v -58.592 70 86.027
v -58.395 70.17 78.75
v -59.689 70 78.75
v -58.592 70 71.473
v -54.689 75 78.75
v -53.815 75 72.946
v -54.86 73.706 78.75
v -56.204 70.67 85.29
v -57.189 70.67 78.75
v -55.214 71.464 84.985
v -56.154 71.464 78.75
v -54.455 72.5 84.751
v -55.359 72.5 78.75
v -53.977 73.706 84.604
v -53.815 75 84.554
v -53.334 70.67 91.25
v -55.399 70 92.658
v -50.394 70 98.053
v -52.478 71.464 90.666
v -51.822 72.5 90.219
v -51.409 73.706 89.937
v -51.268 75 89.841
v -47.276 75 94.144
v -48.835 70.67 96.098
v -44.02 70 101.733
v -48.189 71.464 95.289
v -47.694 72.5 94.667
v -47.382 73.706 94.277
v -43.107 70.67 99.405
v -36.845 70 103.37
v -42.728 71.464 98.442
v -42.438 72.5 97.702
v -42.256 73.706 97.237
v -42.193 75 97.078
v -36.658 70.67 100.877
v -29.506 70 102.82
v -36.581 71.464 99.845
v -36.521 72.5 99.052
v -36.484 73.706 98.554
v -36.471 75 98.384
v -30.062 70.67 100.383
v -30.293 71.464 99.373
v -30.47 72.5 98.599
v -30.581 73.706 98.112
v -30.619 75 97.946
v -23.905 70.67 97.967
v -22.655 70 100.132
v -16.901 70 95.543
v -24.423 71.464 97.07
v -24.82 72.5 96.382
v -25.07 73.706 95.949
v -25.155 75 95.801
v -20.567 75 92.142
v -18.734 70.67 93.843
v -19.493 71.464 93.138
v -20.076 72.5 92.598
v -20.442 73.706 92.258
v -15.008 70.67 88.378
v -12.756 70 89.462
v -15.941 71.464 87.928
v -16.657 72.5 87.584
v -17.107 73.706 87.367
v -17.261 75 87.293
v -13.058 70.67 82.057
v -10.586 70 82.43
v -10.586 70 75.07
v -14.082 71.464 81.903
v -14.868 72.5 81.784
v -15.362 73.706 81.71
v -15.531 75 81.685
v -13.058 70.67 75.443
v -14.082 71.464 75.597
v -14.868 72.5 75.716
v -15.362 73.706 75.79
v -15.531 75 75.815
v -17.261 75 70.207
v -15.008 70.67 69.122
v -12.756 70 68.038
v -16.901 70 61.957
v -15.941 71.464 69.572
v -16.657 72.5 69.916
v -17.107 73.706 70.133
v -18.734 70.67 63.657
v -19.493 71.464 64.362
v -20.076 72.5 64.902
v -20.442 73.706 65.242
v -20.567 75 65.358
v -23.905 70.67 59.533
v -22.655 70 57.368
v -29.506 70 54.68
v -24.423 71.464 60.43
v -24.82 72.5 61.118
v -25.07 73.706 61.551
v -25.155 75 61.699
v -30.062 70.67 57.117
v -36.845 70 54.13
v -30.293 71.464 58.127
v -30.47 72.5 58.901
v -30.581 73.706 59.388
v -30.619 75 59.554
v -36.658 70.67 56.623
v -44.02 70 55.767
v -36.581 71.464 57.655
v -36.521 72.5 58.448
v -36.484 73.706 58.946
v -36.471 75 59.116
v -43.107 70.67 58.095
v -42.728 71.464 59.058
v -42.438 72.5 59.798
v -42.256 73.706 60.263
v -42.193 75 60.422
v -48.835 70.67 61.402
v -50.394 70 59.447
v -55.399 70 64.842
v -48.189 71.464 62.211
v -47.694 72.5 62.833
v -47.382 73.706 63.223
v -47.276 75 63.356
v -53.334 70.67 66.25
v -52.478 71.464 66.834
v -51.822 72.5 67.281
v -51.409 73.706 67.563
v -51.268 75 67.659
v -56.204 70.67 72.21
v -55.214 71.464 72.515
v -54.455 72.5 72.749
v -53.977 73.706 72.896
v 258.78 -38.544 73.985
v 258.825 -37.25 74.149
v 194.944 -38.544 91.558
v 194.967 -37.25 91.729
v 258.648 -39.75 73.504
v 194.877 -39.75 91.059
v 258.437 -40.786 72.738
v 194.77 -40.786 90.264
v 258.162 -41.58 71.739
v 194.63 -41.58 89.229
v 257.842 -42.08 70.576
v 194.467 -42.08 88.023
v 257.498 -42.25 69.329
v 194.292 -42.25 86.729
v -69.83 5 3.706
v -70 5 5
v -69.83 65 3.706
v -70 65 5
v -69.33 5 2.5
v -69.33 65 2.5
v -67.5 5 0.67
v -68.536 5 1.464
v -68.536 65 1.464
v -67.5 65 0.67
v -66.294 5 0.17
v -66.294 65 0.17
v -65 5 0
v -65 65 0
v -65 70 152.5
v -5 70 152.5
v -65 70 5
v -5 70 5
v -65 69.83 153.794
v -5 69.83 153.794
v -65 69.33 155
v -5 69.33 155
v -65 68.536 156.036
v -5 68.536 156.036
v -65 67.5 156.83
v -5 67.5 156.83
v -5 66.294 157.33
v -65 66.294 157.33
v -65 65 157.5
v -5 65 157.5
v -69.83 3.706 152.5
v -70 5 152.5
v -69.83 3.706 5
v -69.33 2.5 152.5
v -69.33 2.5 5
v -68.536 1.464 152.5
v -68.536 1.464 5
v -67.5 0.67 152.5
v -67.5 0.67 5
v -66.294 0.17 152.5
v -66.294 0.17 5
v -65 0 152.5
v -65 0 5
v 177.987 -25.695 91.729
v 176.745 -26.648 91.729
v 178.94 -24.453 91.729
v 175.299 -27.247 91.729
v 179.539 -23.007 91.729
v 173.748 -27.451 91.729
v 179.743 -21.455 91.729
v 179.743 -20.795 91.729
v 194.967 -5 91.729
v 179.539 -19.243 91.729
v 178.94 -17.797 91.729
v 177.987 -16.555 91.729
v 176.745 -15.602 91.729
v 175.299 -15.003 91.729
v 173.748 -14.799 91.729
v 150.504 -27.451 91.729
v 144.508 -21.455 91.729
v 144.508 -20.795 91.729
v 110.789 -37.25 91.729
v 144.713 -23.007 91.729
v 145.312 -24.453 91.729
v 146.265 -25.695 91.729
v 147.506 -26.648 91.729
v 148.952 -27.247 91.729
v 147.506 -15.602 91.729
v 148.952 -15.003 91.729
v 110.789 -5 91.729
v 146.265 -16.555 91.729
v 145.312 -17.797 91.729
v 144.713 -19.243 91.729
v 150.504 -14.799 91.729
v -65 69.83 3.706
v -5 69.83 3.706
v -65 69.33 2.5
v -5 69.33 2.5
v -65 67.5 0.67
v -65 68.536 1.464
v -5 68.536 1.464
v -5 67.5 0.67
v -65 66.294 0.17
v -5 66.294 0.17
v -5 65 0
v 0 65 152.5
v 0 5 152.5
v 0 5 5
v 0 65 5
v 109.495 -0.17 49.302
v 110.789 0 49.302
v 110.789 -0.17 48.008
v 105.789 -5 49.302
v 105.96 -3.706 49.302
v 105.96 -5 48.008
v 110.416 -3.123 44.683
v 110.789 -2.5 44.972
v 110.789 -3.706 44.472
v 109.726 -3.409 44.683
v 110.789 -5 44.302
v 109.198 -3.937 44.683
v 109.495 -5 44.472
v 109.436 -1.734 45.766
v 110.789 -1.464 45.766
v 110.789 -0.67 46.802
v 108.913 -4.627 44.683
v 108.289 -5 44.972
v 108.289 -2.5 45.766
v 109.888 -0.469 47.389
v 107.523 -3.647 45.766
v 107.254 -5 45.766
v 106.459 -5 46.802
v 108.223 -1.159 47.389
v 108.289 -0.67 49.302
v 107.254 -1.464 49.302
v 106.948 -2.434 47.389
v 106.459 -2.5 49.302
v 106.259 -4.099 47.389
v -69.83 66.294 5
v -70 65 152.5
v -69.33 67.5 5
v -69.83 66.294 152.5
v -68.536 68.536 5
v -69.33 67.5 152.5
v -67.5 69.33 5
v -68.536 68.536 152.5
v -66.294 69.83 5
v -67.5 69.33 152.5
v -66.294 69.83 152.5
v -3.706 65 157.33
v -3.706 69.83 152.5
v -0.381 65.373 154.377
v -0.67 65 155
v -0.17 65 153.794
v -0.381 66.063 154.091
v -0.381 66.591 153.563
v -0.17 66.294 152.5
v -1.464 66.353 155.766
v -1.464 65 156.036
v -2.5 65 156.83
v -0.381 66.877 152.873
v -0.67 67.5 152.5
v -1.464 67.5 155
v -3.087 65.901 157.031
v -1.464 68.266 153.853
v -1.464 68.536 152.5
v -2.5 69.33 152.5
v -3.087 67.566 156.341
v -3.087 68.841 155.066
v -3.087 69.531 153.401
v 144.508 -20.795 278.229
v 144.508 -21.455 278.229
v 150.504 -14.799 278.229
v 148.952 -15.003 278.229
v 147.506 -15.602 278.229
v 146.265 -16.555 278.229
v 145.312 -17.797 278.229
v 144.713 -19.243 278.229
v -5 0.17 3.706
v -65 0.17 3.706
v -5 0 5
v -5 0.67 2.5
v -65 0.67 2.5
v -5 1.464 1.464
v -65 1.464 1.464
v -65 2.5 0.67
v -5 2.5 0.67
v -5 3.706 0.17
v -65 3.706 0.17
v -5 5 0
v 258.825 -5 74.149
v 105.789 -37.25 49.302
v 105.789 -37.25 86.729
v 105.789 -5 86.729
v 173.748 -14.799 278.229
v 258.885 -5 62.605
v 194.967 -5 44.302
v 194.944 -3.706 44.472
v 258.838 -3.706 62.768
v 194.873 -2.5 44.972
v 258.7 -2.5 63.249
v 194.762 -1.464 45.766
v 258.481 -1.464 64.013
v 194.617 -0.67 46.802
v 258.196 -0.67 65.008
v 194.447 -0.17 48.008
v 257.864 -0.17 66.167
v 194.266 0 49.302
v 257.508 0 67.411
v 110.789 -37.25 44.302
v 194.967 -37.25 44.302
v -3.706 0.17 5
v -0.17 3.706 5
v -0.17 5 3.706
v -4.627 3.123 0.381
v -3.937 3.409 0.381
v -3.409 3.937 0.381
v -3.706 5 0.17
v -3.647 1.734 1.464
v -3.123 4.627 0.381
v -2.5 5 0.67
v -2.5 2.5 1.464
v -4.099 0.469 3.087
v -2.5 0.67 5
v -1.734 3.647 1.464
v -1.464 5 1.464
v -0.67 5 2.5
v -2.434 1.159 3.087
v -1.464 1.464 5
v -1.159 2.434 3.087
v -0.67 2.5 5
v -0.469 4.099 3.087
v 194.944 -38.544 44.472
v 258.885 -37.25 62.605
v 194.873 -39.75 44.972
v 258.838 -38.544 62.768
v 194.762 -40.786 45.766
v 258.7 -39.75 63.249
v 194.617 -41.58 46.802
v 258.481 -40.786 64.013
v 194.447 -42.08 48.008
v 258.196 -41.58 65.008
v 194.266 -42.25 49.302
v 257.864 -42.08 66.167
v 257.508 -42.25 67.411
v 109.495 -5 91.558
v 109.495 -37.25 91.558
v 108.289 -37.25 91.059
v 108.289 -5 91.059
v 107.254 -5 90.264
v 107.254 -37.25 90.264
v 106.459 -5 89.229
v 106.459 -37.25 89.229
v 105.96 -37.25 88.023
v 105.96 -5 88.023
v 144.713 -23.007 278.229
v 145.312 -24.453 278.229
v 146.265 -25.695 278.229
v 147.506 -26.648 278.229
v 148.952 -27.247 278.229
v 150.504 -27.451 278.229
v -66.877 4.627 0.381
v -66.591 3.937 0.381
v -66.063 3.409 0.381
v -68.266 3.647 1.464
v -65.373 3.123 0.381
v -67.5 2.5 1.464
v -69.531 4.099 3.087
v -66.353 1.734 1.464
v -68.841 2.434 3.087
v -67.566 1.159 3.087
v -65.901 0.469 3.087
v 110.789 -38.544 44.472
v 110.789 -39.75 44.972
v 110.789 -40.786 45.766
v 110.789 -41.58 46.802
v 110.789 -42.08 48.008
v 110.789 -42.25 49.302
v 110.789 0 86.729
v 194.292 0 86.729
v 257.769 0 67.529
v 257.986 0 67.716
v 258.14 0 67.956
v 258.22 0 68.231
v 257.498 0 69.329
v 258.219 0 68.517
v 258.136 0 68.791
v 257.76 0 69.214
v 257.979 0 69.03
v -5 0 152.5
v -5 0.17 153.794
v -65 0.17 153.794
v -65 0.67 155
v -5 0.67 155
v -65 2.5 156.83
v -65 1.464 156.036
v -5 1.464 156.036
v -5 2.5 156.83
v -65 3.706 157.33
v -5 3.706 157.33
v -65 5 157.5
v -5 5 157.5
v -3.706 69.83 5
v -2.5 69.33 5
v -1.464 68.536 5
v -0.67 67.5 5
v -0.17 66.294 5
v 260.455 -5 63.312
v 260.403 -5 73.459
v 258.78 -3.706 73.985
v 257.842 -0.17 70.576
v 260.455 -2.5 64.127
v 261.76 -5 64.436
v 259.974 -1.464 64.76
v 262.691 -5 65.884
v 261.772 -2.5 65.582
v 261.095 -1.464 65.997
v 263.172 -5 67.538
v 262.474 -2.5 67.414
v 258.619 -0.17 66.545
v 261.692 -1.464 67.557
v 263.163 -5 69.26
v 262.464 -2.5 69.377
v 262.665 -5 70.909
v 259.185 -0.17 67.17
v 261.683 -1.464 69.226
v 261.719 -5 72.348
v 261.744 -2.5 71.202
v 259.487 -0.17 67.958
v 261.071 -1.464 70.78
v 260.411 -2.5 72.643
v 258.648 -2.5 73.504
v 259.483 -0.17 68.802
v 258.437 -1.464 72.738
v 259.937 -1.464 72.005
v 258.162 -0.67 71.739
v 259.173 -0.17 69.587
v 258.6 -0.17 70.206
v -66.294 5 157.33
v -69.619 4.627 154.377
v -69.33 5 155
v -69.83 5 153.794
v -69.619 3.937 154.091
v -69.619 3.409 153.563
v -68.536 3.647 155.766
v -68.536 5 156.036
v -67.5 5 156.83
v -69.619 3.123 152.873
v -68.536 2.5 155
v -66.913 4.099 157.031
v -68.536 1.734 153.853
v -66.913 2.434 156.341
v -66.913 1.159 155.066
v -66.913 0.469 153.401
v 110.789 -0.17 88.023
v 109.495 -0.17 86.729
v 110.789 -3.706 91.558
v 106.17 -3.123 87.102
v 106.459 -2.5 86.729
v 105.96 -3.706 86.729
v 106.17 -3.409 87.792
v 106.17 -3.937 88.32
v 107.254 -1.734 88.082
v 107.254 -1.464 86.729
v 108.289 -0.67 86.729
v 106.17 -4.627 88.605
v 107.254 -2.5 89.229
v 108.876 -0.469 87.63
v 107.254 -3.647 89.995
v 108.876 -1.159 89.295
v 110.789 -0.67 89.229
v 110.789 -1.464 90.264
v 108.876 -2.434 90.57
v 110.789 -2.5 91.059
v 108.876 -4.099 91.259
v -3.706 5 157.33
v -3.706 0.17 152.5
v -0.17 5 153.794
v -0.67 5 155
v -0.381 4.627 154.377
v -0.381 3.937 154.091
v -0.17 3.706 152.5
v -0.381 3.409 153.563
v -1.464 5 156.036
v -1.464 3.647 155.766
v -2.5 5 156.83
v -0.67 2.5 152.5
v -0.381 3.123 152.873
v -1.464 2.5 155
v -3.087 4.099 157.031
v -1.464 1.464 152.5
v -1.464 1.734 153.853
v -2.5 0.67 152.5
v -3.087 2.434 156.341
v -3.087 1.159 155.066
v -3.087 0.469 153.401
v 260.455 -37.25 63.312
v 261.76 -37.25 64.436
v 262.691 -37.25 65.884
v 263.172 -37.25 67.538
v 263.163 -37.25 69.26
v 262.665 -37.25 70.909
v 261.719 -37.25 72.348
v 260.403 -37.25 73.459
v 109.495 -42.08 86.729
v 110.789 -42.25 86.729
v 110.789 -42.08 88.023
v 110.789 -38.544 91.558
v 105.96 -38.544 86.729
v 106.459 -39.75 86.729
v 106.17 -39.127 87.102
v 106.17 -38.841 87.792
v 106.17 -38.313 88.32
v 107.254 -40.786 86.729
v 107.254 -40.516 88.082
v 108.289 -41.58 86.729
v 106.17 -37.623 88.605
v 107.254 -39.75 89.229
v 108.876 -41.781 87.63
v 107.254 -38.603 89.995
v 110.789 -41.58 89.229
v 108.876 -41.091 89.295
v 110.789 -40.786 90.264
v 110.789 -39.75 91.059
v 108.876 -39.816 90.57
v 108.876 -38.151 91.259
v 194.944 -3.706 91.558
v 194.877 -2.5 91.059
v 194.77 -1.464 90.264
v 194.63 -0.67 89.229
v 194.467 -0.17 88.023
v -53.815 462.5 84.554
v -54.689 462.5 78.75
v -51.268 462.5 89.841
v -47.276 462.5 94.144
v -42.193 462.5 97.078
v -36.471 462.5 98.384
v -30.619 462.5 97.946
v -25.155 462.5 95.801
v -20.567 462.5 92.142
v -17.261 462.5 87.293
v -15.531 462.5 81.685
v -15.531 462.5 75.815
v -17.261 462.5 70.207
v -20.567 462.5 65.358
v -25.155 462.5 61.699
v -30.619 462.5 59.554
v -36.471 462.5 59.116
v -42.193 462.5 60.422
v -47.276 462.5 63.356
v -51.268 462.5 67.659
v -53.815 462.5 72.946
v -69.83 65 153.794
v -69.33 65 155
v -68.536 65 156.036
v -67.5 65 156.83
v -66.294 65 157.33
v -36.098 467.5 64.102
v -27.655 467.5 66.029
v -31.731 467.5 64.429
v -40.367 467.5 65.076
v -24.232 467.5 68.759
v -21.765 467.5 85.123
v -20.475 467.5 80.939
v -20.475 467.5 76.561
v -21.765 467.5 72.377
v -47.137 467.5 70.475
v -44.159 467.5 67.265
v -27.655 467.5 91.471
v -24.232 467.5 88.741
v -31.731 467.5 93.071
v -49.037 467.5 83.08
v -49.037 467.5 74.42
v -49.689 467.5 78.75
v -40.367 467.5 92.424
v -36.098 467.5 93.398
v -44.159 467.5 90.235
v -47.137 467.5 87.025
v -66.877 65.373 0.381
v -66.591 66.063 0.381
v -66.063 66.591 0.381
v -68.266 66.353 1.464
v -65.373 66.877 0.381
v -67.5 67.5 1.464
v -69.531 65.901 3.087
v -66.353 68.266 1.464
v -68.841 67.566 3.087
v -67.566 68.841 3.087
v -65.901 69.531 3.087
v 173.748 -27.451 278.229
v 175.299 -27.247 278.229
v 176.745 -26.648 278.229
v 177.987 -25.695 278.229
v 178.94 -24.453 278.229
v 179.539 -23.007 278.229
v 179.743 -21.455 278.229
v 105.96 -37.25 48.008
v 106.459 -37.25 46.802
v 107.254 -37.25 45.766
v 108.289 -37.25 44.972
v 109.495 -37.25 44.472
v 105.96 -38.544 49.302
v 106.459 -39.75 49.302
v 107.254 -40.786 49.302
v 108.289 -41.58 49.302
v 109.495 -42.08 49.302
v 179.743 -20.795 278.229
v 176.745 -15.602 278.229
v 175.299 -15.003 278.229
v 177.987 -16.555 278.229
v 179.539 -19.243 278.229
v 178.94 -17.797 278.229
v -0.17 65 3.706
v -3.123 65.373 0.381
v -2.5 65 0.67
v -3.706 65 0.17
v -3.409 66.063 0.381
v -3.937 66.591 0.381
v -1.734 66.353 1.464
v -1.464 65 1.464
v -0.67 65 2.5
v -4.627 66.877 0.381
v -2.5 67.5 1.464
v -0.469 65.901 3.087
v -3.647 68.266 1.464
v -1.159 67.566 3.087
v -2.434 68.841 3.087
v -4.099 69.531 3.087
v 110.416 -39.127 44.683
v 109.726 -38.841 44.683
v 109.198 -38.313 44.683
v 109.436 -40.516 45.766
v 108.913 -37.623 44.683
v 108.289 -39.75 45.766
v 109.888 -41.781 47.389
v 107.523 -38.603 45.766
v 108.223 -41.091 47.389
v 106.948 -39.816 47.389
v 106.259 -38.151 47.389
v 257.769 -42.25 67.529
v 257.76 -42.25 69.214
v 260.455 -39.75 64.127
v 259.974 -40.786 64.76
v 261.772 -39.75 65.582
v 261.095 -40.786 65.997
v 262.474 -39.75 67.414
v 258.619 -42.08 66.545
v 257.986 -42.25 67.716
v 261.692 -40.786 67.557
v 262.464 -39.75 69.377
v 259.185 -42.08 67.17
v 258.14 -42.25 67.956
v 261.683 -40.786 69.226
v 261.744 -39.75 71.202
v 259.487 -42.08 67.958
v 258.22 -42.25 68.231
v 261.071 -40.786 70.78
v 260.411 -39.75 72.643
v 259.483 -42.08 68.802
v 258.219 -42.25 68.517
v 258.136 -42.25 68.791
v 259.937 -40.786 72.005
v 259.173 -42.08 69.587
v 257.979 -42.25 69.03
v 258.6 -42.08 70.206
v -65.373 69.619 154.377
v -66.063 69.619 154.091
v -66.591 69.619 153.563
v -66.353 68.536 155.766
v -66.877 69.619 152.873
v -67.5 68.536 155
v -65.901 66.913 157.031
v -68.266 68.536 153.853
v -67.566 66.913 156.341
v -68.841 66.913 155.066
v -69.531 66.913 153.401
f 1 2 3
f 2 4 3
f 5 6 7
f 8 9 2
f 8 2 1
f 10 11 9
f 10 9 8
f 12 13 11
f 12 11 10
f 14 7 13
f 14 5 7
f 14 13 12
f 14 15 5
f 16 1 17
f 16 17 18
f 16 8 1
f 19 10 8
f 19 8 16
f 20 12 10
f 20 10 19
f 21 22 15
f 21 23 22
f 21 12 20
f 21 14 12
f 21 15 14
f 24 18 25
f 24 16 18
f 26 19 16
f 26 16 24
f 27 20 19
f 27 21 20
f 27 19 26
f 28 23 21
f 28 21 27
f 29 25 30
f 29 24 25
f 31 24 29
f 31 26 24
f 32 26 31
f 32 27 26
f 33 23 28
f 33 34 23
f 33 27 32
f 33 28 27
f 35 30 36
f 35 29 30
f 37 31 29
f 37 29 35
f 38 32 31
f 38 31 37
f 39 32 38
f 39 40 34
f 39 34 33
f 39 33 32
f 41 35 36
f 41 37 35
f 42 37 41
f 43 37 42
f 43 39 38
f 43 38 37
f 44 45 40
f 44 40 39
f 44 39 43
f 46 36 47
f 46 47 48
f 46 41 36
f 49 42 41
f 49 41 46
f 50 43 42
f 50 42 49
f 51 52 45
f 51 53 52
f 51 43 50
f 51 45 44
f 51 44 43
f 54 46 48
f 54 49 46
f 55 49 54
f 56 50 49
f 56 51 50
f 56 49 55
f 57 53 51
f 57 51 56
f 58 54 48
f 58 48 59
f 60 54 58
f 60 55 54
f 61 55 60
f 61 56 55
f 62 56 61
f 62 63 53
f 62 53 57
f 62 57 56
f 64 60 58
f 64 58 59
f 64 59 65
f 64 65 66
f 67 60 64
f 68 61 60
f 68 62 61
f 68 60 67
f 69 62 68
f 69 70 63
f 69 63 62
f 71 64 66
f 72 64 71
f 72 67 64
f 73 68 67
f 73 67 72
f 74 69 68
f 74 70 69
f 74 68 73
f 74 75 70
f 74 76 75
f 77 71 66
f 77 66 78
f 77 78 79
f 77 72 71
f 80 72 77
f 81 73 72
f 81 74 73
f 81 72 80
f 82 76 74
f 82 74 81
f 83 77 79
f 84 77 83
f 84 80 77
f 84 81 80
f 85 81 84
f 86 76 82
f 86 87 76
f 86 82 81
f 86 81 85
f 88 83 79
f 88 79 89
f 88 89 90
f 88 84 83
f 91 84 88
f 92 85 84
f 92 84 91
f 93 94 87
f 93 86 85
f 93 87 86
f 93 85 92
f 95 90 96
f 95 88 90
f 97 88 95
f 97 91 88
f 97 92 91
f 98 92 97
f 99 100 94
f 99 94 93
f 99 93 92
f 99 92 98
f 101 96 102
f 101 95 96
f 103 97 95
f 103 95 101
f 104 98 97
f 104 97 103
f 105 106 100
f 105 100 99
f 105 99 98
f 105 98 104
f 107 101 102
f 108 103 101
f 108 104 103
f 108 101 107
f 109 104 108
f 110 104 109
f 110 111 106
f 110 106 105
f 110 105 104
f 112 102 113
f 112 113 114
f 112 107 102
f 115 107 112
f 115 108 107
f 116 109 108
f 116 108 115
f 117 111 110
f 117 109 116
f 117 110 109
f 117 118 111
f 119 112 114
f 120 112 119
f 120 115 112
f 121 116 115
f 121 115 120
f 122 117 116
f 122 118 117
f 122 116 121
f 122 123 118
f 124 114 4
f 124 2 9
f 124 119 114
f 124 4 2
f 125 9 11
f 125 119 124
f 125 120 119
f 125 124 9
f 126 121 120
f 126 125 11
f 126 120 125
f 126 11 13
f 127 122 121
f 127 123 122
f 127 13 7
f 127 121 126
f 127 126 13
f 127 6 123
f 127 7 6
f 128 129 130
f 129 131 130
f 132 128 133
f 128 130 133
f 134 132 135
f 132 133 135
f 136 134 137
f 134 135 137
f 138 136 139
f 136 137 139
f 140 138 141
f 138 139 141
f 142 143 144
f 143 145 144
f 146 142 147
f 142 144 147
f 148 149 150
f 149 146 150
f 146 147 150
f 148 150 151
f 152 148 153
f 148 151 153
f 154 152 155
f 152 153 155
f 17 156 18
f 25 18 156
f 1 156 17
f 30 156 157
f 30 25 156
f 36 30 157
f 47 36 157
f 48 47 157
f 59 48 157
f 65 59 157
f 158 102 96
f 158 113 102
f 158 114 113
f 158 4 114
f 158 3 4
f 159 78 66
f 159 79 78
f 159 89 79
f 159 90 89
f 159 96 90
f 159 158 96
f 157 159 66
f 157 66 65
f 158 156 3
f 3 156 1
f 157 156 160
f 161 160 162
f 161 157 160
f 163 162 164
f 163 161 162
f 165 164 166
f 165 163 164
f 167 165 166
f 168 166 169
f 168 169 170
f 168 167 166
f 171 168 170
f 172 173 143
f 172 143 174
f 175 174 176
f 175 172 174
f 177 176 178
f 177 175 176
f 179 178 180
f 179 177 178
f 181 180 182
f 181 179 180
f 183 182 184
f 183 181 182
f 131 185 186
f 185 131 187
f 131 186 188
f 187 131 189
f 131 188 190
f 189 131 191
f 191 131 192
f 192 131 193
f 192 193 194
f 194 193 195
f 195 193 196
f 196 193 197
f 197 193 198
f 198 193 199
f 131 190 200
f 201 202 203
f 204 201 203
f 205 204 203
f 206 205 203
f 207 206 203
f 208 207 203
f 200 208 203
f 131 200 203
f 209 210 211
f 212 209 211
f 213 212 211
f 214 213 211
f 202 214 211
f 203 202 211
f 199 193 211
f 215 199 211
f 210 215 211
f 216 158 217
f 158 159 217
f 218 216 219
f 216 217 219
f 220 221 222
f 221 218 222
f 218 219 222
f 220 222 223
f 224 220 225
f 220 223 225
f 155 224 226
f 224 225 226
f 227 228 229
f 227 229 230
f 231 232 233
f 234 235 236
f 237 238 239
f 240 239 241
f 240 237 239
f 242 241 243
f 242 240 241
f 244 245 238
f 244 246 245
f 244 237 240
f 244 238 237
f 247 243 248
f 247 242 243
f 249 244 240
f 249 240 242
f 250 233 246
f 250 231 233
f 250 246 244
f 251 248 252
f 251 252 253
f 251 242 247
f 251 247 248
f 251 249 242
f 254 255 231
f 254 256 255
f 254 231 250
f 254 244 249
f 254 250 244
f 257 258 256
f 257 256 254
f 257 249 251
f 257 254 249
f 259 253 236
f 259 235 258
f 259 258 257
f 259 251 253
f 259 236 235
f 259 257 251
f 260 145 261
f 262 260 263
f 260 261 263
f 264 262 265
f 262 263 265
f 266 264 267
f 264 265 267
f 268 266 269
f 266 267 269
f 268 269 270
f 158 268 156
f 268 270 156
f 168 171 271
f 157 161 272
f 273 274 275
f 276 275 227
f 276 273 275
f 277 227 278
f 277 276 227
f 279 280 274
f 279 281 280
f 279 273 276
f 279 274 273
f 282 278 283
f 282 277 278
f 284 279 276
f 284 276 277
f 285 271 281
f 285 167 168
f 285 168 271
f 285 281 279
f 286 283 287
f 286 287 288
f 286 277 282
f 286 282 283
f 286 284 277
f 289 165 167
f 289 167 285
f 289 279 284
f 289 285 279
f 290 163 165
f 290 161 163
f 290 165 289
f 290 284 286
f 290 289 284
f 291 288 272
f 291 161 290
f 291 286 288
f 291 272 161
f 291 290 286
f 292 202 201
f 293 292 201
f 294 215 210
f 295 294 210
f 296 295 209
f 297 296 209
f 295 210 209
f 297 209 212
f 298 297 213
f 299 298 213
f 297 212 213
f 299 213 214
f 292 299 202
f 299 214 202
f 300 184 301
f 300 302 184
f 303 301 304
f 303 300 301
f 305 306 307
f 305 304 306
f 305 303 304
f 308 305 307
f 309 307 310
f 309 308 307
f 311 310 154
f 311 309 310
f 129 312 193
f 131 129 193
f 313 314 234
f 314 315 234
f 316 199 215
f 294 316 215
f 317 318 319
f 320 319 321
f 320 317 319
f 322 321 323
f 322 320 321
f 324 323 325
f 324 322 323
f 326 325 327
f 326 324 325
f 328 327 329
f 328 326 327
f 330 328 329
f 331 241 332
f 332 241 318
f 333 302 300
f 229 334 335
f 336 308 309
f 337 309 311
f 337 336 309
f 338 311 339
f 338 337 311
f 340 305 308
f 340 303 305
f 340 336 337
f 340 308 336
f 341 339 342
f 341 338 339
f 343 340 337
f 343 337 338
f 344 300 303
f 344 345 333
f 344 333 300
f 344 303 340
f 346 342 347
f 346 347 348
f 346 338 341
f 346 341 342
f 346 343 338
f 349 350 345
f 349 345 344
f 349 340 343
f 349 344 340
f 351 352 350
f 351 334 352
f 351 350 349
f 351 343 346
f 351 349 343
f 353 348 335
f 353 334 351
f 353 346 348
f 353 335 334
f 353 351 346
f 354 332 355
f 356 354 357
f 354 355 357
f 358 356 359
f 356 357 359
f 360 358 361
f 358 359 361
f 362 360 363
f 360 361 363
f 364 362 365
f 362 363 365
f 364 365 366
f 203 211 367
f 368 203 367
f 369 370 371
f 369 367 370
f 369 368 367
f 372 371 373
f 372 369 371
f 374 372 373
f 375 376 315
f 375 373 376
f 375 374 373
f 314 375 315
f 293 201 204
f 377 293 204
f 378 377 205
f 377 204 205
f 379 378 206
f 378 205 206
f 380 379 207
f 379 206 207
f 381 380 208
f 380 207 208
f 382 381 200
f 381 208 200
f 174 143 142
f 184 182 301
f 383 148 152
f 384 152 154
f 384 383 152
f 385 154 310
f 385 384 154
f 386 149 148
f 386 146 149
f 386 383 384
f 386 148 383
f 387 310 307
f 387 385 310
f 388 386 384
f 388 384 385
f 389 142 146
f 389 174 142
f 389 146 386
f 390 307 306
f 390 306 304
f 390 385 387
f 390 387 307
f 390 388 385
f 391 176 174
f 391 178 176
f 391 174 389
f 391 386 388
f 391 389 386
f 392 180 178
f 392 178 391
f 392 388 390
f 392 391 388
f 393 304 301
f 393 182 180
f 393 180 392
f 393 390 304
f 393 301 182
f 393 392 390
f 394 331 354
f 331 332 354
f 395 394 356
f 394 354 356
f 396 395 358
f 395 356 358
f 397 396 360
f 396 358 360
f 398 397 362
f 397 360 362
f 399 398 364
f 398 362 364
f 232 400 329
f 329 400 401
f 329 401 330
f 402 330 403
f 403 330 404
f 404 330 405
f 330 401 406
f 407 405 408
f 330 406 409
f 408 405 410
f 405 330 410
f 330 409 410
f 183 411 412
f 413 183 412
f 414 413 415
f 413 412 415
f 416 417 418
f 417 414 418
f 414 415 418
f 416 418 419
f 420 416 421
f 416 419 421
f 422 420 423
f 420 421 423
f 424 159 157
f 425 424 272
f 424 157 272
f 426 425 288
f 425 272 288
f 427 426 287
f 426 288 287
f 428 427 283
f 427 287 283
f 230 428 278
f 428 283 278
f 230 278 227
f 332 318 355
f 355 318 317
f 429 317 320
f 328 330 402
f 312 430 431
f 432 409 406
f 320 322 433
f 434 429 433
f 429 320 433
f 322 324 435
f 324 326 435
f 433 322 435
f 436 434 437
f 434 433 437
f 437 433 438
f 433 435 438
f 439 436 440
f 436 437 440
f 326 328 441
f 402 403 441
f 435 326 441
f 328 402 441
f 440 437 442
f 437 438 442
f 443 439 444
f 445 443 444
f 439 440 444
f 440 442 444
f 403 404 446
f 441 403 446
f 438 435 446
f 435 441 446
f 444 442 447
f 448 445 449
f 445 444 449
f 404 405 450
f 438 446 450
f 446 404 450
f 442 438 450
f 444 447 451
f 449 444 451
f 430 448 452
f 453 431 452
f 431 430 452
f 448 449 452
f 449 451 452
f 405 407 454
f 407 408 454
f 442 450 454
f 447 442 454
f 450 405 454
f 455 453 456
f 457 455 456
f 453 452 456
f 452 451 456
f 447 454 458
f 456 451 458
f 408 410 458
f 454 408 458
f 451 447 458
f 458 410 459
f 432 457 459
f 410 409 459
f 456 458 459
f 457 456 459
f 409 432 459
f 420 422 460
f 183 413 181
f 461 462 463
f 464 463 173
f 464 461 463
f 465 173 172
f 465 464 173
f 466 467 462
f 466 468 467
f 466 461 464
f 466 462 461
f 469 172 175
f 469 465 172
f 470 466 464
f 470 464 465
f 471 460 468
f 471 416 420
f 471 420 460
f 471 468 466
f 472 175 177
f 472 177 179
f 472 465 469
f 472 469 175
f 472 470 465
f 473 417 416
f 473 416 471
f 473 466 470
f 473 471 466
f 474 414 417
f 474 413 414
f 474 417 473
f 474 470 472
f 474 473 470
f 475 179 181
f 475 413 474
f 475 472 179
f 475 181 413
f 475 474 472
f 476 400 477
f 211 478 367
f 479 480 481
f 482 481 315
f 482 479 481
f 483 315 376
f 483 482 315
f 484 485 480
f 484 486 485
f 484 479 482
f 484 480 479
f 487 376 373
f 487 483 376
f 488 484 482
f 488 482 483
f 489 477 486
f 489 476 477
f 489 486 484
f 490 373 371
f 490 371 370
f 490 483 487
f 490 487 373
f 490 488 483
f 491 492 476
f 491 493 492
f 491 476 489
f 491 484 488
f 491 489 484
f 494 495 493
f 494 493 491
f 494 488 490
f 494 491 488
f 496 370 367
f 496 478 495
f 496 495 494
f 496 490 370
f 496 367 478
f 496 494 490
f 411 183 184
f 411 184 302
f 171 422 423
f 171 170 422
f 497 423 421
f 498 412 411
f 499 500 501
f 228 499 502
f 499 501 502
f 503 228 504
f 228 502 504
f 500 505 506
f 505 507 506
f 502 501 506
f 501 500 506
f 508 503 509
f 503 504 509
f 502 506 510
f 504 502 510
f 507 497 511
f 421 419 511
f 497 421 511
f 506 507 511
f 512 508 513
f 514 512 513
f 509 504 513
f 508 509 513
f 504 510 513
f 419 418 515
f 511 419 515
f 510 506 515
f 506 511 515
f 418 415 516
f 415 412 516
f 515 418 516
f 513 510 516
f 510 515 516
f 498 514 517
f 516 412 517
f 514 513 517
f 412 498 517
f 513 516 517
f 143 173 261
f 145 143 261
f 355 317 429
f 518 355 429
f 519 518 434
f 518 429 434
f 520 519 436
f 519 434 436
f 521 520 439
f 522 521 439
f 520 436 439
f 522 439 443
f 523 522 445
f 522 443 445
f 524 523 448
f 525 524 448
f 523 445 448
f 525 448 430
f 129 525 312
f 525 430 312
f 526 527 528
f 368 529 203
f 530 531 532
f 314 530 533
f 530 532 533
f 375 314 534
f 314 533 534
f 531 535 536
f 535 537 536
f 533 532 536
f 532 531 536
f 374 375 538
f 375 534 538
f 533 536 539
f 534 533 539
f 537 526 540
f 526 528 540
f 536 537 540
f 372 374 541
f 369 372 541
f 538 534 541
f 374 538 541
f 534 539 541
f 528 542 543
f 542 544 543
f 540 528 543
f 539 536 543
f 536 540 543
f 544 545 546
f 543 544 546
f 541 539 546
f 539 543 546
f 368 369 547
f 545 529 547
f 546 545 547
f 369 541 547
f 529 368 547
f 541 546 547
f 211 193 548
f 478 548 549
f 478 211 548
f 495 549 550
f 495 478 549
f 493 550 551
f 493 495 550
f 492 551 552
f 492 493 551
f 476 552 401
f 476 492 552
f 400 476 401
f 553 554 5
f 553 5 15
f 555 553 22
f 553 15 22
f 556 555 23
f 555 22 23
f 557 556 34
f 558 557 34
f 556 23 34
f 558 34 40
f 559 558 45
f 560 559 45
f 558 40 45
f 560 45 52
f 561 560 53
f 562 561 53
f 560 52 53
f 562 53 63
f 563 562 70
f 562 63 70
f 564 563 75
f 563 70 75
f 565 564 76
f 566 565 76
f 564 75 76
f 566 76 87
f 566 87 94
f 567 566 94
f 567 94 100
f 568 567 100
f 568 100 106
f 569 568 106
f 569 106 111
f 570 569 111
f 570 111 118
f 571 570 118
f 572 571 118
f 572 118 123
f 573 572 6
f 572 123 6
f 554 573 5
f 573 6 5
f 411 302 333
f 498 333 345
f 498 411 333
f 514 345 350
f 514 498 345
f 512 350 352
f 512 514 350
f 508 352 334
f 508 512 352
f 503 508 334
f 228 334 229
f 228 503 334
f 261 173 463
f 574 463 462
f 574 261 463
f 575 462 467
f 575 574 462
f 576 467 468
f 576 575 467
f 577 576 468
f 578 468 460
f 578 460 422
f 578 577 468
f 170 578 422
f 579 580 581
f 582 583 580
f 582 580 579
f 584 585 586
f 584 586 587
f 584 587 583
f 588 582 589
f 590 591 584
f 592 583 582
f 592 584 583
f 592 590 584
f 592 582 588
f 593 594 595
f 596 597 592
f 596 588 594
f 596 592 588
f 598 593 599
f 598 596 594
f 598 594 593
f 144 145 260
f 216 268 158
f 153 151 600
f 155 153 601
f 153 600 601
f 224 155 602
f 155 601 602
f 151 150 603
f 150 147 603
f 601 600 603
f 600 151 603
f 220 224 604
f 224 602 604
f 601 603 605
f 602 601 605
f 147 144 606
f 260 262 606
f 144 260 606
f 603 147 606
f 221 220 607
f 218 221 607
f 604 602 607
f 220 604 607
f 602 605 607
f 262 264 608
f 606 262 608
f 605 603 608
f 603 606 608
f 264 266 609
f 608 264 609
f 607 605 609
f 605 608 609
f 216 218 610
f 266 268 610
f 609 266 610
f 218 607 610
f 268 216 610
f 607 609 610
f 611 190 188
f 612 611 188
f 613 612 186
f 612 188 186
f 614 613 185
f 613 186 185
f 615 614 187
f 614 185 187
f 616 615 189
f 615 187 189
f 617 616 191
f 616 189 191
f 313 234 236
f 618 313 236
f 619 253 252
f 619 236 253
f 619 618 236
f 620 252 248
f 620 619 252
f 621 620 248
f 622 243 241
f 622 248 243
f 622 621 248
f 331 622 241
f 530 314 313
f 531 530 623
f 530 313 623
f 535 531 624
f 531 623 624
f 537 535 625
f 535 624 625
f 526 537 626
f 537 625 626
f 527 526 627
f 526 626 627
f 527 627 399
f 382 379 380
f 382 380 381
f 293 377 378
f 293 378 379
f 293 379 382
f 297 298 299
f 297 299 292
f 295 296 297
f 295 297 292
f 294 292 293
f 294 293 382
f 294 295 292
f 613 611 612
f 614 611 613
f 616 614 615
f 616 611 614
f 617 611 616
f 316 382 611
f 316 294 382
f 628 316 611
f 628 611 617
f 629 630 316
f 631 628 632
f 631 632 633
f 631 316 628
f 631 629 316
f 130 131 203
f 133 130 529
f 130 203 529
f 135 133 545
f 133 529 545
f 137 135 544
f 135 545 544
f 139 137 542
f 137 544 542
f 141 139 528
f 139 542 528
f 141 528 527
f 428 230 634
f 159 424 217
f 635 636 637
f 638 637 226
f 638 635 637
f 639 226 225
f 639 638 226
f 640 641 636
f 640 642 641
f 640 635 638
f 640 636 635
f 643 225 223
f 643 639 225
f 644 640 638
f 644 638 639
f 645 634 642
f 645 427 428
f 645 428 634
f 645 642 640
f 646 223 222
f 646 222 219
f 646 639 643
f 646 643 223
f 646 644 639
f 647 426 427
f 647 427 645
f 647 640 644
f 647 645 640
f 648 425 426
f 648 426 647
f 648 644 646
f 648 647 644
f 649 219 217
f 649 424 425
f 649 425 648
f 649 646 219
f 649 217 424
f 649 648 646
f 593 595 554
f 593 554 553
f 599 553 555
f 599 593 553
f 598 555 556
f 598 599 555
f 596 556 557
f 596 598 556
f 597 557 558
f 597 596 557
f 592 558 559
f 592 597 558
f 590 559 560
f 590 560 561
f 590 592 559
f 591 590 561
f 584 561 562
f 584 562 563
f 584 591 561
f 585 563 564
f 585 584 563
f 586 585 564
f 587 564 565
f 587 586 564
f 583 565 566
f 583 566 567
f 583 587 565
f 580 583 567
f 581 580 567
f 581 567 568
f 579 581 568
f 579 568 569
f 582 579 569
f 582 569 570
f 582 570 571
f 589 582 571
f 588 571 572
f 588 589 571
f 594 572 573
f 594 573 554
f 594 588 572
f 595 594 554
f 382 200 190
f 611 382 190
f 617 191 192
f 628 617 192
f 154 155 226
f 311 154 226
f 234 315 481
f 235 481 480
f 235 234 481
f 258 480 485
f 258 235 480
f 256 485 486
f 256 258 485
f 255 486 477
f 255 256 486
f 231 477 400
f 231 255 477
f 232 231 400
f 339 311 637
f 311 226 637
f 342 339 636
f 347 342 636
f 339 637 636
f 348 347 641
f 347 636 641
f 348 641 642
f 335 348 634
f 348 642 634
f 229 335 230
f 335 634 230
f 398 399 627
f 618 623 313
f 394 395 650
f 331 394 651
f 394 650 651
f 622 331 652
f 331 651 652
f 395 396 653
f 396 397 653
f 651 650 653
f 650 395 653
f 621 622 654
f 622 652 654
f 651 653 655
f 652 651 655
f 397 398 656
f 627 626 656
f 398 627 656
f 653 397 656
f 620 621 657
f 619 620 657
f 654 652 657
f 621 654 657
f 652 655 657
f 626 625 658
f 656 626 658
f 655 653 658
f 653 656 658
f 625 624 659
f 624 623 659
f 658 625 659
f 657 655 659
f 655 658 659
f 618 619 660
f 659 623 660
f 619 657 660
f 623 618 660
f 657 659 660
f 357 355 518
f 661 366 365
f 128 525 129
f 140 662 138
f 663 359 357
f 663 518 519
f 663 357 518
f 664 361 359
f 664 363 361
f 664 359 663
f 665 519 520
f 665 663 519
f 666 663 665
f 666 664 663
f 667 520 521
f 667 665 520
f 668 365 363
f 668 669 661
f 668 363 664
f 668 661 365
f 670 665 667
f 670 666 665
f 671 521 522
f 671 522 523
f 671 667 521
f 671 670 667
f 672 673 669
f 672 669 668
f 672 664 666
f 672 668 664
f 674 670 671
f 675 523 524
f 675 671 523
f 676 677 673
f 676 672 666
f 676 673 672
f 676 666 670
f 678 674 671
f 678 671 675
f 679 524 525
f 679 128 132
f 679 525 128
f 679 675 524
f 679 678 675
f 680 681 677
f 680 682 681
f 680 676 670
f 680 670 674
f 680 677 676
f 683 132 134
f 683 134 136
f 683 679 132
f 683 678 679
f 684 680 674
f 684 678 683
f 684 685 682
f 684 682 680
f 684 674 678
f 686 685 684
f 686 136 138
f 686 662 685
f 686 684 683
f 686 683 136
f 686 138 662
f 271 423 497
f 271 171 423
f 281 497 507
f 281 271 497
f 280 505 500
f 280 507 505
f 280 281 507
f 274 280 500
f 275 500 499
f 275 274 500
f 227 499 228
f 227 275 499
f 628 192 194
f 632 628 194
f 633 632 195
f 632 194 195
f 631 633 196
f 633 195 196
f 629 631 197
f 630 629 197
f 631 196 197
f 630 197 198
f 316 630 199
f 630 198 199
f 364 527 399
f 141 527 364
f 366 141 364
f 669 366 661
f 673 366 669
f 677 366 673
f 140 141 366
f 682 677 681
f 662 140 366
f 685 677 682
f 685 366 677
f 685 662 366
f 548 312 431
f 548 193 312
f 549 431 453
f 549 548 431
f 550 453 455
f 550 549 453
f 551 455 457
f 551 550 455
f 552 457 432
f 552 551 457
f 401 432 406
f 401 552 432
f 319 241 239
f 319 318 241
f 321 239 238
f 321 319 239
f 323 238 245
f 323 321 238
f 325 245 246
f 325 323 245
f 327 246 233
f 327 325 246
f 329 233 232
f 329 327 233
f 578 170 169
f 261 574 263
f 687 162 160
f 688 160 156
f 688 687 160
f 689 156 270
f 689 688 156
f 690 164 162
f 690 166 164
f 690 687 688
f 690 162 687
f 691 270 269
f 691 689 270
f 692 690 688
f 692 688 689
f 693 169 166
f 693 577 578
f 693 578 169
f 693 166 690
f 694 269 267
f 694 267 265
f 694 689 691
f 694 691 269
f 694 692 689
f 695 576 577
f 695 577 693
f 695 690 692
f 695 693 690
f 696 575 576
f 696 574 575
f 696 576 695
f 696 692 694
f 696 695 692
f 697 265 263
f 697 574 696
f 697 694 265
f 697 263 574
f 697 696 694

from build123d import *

# Parameters (mm, degrees)
F0_W      = 70
F0_H      = 70
F1_DEPTH  = 157.5
F2_R      = 19.6893501148
F3_DEPTH  = 397.5
F4_R      = 5
F5_SIZE   = 5
F7_DEPTH  = 42.25
F8_R      = 5
F10_DEPTH = 186.5


with BuildPart() as f1:
    # F0 (on Top) → F1 (new body)
    with BuildSketch(Plane.XY):
        with Locations((-35, 35)):
            Rectangle(F0_W, F0_H)
    extrude(amount=F1_DEPTH)

    # F2 (on face) → F3 (join)
    with BuildSketch(Plane(origin=(0, 70, 0), x_dir=(-1, 0, 0), z_dir=(0, 1, 0))):
        with Locations((35, 78.75)):
            Circle(F2_R)
    extrude(amount=F3_DEPTH)

    # F4
    f4_edges = [f1.edges().sort_by_distance(p)[0] for p in [
        (-35, 0, 157.5),
        (-70, 35, 157.5),
        (-35, 70, 157.5),
        (0, 35, 157.5),
        (-70, 70, 78.75),
        (-70, 0, 78.75),
        (-70, 35, 0),
        (0, 0, 78.75),
        (-35, 0, 0),
        (0, 70, 78.75),
        (0, 35, 0),
        (-35, 70, 0),
        (-15.31065, 70, 78.75),
    ]]
    fillet(f4_edges, radius=F4_R)

    # F5
    f5_edges = [f1.edges().sort_by_distance(p)[0] for p in [
        (-15.31065, 467.5, 78.75),
    ]]
    chamfer(f5_edges, length=F5_SIZE)


with BuildPart() as f7:
    # F6 (on Front) → F7 (new body)
    with BuildSketch(Plane.XZ):
        with BuildLine():
            Line((194.9674934149, 91.7287990451), (105.7893633842, 91.7287990451))
            Line((105.7893633842, 91.7287990451), (105.7893633842, 44.3020164967))
            Line((105.7893633842, 44.3020164967), (194.9674934149, 44.3020164967))
            Line((194.9674934149, 44.3020164967), (258.8846396141, 62.6046827878))
            ThreePointArc((258.8846396141, 62.6046827878), (263.2297556276, 68.399496141), (258.8254546291, 74.1494550699))
            Line((258.8254546291, 74.1494550699), (194.9674934149, 91.7287990451))
        make_face()
    extrude(amount=F7_DEPTH)

    # F8
    f8_edges = [f7.edges().sort_by_distance(p)[0] for p in [
        (150.378428, -42.25, 91.728799),
        (105.789363, -42.25, 68.015408),
        (150.378428, -42.25, 44.302016),
        (226.926067, -42.25, 53.45335),
        (263.229756, -42.25, 68.399496),
        (226.896474, -42.25, 82.939127),
        (150.378428, 0, 91.728799),
        (105.789363, 0, 68.015408),
        (150.378428, 0, 44.302016),
        (226.926067, 0, 53.45335),
        (263.229756, 0, 68.399496),
        (226.896474, 0, 82.939127),
        (105.789363, -21.125, 91.728799),
        (105.789363, -21.125, 44.302016),
    ]]
    fillet(f8_edges, radius=F8_R)

    # F9 (on face) → F10 (join)
    with BuildSketch(Plane.XY.offset(91.7287990451)):
        with BuildLine():
            Line((173.7475228812, -14.7991525009), (150.504158685, -14.7991525009))
            ThreePointArc((150.504158685, -14.7991525009), (146.2645322074, -16.5552632873), (144.5084214211, -20.7948897649))
            Line((144.5084214211, -20.7948897649), (144.5084214211, -21.4551102351))
            ThreePointArc((144.5084214211, -21.4551102351), (146.2645322074, -25.6947367127), (150.504158685, -27.4508474991))
            Line((150.504158685, -27.4508474991), (173.7475228812, -27.4508474991))
            ThreePointArc((173.7475228812, -27.4508474991), (177.9871493588, -25.6947367127), (179.7432601452, -21.4551102351))
            Line((179.7432601452, -21.4551102351), (179.7432601452, -20.7948897649))
            ThreePointArc((179.7432601452, -20.7948897649), (177.9871493588, -16.5552632873), (173.7475228812, -14.7991525009))
        make_face()
    extrude(amount=F10_DEPTH)


solid = Compound([f1.part, f7.part])
